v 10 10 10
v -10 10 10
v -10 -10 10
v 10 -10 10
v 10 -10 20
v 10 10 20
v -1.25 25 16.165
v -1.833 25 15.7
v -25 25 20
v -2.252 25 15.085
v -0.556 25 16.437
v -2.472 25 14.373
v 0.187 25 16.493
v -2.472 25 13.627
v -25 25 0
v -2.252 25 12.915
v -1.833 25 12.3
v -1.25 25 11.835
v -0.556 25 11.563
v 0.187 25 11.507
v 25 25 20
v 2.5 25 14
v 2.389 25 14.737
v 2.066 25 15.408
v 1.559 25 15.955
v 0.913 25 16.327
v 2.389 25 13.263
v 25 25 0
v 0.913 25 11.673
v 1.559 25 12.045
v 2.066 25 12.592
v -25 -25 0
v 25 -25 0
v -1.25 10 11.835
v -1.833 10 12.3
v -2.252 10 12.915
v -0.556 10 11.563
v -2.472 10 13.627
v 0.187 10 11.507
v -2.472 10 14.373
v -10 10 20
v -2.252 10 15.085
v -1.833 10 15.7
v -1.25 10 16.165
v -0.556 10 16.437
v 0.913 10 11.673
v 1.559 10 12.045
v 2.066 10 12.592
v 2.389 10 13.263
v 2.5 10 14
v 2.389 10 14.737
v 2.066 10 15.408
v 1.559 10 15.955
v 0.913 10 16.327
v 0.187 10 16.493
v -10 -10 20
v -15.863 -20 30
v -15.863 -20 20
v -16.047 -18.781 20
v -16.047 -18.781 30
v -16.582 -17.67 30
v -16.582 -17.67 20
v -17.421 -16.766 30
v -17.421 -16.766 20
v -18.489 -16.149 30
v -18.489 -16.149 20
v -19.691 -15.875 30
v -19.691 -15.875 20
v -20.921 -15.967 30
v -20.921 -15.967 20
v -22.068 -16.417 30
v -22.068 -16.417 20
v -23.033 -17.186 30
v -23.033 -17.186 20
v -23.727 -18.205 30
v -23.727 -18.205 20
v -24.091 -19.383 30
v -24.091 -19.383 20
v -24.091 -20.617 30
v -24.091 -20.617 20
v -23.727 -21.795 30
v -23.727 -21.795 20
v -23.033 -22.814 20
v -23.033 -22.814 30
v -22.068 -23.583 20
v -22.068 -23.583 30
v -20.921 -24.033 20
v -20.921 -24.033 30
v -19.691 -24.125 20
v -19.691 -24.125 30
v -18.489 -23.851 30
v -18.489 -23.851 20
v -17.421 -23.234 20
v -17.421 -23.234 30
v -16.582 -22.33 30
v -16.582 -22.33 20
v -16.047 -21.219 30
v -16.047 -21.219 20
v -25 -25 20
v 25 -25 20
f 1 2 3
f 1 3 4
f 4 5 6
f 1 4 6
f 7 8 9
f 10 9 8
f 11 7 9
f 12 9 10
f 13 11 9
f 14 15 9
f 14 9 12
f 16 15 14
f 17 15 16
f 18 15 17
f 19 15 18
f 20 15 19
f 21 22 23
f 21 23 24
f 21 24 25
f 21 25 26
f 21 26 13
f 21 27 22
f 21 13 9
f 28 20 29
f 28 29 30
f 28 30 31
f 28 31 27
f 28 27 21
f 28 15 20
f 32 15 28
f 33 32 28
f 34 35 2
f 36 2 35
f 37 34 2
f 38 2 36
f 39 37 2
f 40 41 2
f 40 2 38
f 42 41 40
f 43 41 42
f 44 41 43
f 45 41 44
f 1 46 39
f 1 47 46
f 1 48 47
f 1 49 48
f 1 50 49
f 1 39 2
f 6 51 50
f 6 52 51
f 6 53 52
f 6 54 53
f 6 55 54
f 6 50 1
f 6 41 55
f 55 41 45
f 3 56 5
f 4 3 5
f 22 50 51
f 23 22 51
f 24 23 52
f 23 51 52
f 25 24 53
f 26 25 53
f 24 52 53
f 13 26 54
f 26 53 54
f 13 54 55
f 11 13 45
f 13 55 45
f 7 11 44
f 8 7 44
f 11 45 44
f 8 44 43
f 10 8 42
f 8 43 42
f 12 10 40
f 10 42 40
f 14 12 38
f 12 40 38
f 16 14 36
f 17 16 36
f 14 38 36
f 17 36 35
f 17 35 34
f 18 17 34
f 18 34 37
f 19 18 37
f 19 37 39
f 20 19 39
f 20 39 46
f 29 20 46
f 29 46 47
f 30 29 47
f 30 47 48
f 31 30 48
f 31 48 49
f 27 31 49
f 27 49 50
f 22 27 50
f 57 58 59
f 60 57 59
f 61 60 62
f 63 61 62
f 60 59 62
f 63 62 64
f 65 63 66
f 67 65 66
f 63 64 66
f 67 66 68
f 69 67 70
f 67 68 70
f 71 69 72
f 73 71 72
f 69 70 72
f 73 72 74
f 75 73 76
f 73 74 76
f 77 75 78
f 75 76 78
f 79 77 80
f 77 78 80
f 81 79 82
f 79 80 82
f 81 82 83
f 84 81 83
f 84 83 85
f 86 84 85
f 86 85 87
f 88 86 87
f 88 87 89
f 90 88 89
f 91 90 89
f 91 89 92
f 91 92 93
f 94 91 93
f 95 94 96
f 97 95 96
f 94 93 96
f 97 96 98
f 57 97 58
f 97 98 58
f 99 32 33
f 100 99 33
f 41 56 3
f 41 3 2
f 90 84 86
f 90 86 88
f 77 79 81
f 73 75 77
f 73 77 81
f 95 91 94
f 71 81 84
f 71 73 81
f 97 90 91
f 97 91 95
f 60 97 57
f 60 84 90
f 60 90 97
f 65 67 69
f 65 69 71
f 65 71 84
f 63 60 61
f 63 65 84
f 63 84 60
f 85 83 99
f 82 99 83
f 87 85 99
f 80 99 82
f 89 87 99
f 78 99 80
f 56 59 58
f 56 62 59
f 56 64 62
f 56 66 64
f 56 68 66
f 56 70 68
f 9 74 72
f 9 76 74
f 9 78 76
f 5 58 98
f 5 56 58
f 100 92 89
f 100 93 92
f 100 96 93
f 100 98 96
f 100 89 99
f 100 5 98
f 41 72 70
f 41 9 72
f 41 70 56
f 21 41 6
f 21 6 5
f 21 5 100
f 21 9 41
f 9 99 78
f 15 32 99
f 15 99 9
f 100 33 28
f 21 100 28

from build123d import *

# Parameters (mm, degrees)
F0_W     = 50
F0_H     = 50
F1_DEPTH = 20
F2_W     = 20
F2_H     = 20
F3_DEPTH = 10
F4_R     = 4.13691
F5_DEPTH = 10
F6_R     = 2.5
F7_DEPTH = 24.5615


with BuildPart() as f1:
    # F0 (on Top) → F1 (new body)
    with BuildSketch(Plane.XY):
        Rectangle(F0_W, F0_H)
    extrude(amount=F1_DEPTH)

    # F2 (on face) → F3 (cut)
    with BuildSketch(Plane.XY.offset(20)):
        Rectangle(F2_W, F2_H)
    extrude(amount=-F3_DEPTH, mode=Mode.SUBTRACT)

    # F4 (on face) → F5 (join)
    with BuildSketch(Plane.XY.offset(20)):
        with Locations((-20, -20)):
            Circle(F4_R)
    extrude(amount=F5_DEPTH)

    # F6 (on face) → F7 (cut)
    with BuildSketch(Plane.XZ.offset(-10)):
        with Locations((0, 14)):
            Circle(F6_R)
    extrude(amount=-F7_DEPTH, mode=Mode.SUBTRACT)


solid = f1.part
